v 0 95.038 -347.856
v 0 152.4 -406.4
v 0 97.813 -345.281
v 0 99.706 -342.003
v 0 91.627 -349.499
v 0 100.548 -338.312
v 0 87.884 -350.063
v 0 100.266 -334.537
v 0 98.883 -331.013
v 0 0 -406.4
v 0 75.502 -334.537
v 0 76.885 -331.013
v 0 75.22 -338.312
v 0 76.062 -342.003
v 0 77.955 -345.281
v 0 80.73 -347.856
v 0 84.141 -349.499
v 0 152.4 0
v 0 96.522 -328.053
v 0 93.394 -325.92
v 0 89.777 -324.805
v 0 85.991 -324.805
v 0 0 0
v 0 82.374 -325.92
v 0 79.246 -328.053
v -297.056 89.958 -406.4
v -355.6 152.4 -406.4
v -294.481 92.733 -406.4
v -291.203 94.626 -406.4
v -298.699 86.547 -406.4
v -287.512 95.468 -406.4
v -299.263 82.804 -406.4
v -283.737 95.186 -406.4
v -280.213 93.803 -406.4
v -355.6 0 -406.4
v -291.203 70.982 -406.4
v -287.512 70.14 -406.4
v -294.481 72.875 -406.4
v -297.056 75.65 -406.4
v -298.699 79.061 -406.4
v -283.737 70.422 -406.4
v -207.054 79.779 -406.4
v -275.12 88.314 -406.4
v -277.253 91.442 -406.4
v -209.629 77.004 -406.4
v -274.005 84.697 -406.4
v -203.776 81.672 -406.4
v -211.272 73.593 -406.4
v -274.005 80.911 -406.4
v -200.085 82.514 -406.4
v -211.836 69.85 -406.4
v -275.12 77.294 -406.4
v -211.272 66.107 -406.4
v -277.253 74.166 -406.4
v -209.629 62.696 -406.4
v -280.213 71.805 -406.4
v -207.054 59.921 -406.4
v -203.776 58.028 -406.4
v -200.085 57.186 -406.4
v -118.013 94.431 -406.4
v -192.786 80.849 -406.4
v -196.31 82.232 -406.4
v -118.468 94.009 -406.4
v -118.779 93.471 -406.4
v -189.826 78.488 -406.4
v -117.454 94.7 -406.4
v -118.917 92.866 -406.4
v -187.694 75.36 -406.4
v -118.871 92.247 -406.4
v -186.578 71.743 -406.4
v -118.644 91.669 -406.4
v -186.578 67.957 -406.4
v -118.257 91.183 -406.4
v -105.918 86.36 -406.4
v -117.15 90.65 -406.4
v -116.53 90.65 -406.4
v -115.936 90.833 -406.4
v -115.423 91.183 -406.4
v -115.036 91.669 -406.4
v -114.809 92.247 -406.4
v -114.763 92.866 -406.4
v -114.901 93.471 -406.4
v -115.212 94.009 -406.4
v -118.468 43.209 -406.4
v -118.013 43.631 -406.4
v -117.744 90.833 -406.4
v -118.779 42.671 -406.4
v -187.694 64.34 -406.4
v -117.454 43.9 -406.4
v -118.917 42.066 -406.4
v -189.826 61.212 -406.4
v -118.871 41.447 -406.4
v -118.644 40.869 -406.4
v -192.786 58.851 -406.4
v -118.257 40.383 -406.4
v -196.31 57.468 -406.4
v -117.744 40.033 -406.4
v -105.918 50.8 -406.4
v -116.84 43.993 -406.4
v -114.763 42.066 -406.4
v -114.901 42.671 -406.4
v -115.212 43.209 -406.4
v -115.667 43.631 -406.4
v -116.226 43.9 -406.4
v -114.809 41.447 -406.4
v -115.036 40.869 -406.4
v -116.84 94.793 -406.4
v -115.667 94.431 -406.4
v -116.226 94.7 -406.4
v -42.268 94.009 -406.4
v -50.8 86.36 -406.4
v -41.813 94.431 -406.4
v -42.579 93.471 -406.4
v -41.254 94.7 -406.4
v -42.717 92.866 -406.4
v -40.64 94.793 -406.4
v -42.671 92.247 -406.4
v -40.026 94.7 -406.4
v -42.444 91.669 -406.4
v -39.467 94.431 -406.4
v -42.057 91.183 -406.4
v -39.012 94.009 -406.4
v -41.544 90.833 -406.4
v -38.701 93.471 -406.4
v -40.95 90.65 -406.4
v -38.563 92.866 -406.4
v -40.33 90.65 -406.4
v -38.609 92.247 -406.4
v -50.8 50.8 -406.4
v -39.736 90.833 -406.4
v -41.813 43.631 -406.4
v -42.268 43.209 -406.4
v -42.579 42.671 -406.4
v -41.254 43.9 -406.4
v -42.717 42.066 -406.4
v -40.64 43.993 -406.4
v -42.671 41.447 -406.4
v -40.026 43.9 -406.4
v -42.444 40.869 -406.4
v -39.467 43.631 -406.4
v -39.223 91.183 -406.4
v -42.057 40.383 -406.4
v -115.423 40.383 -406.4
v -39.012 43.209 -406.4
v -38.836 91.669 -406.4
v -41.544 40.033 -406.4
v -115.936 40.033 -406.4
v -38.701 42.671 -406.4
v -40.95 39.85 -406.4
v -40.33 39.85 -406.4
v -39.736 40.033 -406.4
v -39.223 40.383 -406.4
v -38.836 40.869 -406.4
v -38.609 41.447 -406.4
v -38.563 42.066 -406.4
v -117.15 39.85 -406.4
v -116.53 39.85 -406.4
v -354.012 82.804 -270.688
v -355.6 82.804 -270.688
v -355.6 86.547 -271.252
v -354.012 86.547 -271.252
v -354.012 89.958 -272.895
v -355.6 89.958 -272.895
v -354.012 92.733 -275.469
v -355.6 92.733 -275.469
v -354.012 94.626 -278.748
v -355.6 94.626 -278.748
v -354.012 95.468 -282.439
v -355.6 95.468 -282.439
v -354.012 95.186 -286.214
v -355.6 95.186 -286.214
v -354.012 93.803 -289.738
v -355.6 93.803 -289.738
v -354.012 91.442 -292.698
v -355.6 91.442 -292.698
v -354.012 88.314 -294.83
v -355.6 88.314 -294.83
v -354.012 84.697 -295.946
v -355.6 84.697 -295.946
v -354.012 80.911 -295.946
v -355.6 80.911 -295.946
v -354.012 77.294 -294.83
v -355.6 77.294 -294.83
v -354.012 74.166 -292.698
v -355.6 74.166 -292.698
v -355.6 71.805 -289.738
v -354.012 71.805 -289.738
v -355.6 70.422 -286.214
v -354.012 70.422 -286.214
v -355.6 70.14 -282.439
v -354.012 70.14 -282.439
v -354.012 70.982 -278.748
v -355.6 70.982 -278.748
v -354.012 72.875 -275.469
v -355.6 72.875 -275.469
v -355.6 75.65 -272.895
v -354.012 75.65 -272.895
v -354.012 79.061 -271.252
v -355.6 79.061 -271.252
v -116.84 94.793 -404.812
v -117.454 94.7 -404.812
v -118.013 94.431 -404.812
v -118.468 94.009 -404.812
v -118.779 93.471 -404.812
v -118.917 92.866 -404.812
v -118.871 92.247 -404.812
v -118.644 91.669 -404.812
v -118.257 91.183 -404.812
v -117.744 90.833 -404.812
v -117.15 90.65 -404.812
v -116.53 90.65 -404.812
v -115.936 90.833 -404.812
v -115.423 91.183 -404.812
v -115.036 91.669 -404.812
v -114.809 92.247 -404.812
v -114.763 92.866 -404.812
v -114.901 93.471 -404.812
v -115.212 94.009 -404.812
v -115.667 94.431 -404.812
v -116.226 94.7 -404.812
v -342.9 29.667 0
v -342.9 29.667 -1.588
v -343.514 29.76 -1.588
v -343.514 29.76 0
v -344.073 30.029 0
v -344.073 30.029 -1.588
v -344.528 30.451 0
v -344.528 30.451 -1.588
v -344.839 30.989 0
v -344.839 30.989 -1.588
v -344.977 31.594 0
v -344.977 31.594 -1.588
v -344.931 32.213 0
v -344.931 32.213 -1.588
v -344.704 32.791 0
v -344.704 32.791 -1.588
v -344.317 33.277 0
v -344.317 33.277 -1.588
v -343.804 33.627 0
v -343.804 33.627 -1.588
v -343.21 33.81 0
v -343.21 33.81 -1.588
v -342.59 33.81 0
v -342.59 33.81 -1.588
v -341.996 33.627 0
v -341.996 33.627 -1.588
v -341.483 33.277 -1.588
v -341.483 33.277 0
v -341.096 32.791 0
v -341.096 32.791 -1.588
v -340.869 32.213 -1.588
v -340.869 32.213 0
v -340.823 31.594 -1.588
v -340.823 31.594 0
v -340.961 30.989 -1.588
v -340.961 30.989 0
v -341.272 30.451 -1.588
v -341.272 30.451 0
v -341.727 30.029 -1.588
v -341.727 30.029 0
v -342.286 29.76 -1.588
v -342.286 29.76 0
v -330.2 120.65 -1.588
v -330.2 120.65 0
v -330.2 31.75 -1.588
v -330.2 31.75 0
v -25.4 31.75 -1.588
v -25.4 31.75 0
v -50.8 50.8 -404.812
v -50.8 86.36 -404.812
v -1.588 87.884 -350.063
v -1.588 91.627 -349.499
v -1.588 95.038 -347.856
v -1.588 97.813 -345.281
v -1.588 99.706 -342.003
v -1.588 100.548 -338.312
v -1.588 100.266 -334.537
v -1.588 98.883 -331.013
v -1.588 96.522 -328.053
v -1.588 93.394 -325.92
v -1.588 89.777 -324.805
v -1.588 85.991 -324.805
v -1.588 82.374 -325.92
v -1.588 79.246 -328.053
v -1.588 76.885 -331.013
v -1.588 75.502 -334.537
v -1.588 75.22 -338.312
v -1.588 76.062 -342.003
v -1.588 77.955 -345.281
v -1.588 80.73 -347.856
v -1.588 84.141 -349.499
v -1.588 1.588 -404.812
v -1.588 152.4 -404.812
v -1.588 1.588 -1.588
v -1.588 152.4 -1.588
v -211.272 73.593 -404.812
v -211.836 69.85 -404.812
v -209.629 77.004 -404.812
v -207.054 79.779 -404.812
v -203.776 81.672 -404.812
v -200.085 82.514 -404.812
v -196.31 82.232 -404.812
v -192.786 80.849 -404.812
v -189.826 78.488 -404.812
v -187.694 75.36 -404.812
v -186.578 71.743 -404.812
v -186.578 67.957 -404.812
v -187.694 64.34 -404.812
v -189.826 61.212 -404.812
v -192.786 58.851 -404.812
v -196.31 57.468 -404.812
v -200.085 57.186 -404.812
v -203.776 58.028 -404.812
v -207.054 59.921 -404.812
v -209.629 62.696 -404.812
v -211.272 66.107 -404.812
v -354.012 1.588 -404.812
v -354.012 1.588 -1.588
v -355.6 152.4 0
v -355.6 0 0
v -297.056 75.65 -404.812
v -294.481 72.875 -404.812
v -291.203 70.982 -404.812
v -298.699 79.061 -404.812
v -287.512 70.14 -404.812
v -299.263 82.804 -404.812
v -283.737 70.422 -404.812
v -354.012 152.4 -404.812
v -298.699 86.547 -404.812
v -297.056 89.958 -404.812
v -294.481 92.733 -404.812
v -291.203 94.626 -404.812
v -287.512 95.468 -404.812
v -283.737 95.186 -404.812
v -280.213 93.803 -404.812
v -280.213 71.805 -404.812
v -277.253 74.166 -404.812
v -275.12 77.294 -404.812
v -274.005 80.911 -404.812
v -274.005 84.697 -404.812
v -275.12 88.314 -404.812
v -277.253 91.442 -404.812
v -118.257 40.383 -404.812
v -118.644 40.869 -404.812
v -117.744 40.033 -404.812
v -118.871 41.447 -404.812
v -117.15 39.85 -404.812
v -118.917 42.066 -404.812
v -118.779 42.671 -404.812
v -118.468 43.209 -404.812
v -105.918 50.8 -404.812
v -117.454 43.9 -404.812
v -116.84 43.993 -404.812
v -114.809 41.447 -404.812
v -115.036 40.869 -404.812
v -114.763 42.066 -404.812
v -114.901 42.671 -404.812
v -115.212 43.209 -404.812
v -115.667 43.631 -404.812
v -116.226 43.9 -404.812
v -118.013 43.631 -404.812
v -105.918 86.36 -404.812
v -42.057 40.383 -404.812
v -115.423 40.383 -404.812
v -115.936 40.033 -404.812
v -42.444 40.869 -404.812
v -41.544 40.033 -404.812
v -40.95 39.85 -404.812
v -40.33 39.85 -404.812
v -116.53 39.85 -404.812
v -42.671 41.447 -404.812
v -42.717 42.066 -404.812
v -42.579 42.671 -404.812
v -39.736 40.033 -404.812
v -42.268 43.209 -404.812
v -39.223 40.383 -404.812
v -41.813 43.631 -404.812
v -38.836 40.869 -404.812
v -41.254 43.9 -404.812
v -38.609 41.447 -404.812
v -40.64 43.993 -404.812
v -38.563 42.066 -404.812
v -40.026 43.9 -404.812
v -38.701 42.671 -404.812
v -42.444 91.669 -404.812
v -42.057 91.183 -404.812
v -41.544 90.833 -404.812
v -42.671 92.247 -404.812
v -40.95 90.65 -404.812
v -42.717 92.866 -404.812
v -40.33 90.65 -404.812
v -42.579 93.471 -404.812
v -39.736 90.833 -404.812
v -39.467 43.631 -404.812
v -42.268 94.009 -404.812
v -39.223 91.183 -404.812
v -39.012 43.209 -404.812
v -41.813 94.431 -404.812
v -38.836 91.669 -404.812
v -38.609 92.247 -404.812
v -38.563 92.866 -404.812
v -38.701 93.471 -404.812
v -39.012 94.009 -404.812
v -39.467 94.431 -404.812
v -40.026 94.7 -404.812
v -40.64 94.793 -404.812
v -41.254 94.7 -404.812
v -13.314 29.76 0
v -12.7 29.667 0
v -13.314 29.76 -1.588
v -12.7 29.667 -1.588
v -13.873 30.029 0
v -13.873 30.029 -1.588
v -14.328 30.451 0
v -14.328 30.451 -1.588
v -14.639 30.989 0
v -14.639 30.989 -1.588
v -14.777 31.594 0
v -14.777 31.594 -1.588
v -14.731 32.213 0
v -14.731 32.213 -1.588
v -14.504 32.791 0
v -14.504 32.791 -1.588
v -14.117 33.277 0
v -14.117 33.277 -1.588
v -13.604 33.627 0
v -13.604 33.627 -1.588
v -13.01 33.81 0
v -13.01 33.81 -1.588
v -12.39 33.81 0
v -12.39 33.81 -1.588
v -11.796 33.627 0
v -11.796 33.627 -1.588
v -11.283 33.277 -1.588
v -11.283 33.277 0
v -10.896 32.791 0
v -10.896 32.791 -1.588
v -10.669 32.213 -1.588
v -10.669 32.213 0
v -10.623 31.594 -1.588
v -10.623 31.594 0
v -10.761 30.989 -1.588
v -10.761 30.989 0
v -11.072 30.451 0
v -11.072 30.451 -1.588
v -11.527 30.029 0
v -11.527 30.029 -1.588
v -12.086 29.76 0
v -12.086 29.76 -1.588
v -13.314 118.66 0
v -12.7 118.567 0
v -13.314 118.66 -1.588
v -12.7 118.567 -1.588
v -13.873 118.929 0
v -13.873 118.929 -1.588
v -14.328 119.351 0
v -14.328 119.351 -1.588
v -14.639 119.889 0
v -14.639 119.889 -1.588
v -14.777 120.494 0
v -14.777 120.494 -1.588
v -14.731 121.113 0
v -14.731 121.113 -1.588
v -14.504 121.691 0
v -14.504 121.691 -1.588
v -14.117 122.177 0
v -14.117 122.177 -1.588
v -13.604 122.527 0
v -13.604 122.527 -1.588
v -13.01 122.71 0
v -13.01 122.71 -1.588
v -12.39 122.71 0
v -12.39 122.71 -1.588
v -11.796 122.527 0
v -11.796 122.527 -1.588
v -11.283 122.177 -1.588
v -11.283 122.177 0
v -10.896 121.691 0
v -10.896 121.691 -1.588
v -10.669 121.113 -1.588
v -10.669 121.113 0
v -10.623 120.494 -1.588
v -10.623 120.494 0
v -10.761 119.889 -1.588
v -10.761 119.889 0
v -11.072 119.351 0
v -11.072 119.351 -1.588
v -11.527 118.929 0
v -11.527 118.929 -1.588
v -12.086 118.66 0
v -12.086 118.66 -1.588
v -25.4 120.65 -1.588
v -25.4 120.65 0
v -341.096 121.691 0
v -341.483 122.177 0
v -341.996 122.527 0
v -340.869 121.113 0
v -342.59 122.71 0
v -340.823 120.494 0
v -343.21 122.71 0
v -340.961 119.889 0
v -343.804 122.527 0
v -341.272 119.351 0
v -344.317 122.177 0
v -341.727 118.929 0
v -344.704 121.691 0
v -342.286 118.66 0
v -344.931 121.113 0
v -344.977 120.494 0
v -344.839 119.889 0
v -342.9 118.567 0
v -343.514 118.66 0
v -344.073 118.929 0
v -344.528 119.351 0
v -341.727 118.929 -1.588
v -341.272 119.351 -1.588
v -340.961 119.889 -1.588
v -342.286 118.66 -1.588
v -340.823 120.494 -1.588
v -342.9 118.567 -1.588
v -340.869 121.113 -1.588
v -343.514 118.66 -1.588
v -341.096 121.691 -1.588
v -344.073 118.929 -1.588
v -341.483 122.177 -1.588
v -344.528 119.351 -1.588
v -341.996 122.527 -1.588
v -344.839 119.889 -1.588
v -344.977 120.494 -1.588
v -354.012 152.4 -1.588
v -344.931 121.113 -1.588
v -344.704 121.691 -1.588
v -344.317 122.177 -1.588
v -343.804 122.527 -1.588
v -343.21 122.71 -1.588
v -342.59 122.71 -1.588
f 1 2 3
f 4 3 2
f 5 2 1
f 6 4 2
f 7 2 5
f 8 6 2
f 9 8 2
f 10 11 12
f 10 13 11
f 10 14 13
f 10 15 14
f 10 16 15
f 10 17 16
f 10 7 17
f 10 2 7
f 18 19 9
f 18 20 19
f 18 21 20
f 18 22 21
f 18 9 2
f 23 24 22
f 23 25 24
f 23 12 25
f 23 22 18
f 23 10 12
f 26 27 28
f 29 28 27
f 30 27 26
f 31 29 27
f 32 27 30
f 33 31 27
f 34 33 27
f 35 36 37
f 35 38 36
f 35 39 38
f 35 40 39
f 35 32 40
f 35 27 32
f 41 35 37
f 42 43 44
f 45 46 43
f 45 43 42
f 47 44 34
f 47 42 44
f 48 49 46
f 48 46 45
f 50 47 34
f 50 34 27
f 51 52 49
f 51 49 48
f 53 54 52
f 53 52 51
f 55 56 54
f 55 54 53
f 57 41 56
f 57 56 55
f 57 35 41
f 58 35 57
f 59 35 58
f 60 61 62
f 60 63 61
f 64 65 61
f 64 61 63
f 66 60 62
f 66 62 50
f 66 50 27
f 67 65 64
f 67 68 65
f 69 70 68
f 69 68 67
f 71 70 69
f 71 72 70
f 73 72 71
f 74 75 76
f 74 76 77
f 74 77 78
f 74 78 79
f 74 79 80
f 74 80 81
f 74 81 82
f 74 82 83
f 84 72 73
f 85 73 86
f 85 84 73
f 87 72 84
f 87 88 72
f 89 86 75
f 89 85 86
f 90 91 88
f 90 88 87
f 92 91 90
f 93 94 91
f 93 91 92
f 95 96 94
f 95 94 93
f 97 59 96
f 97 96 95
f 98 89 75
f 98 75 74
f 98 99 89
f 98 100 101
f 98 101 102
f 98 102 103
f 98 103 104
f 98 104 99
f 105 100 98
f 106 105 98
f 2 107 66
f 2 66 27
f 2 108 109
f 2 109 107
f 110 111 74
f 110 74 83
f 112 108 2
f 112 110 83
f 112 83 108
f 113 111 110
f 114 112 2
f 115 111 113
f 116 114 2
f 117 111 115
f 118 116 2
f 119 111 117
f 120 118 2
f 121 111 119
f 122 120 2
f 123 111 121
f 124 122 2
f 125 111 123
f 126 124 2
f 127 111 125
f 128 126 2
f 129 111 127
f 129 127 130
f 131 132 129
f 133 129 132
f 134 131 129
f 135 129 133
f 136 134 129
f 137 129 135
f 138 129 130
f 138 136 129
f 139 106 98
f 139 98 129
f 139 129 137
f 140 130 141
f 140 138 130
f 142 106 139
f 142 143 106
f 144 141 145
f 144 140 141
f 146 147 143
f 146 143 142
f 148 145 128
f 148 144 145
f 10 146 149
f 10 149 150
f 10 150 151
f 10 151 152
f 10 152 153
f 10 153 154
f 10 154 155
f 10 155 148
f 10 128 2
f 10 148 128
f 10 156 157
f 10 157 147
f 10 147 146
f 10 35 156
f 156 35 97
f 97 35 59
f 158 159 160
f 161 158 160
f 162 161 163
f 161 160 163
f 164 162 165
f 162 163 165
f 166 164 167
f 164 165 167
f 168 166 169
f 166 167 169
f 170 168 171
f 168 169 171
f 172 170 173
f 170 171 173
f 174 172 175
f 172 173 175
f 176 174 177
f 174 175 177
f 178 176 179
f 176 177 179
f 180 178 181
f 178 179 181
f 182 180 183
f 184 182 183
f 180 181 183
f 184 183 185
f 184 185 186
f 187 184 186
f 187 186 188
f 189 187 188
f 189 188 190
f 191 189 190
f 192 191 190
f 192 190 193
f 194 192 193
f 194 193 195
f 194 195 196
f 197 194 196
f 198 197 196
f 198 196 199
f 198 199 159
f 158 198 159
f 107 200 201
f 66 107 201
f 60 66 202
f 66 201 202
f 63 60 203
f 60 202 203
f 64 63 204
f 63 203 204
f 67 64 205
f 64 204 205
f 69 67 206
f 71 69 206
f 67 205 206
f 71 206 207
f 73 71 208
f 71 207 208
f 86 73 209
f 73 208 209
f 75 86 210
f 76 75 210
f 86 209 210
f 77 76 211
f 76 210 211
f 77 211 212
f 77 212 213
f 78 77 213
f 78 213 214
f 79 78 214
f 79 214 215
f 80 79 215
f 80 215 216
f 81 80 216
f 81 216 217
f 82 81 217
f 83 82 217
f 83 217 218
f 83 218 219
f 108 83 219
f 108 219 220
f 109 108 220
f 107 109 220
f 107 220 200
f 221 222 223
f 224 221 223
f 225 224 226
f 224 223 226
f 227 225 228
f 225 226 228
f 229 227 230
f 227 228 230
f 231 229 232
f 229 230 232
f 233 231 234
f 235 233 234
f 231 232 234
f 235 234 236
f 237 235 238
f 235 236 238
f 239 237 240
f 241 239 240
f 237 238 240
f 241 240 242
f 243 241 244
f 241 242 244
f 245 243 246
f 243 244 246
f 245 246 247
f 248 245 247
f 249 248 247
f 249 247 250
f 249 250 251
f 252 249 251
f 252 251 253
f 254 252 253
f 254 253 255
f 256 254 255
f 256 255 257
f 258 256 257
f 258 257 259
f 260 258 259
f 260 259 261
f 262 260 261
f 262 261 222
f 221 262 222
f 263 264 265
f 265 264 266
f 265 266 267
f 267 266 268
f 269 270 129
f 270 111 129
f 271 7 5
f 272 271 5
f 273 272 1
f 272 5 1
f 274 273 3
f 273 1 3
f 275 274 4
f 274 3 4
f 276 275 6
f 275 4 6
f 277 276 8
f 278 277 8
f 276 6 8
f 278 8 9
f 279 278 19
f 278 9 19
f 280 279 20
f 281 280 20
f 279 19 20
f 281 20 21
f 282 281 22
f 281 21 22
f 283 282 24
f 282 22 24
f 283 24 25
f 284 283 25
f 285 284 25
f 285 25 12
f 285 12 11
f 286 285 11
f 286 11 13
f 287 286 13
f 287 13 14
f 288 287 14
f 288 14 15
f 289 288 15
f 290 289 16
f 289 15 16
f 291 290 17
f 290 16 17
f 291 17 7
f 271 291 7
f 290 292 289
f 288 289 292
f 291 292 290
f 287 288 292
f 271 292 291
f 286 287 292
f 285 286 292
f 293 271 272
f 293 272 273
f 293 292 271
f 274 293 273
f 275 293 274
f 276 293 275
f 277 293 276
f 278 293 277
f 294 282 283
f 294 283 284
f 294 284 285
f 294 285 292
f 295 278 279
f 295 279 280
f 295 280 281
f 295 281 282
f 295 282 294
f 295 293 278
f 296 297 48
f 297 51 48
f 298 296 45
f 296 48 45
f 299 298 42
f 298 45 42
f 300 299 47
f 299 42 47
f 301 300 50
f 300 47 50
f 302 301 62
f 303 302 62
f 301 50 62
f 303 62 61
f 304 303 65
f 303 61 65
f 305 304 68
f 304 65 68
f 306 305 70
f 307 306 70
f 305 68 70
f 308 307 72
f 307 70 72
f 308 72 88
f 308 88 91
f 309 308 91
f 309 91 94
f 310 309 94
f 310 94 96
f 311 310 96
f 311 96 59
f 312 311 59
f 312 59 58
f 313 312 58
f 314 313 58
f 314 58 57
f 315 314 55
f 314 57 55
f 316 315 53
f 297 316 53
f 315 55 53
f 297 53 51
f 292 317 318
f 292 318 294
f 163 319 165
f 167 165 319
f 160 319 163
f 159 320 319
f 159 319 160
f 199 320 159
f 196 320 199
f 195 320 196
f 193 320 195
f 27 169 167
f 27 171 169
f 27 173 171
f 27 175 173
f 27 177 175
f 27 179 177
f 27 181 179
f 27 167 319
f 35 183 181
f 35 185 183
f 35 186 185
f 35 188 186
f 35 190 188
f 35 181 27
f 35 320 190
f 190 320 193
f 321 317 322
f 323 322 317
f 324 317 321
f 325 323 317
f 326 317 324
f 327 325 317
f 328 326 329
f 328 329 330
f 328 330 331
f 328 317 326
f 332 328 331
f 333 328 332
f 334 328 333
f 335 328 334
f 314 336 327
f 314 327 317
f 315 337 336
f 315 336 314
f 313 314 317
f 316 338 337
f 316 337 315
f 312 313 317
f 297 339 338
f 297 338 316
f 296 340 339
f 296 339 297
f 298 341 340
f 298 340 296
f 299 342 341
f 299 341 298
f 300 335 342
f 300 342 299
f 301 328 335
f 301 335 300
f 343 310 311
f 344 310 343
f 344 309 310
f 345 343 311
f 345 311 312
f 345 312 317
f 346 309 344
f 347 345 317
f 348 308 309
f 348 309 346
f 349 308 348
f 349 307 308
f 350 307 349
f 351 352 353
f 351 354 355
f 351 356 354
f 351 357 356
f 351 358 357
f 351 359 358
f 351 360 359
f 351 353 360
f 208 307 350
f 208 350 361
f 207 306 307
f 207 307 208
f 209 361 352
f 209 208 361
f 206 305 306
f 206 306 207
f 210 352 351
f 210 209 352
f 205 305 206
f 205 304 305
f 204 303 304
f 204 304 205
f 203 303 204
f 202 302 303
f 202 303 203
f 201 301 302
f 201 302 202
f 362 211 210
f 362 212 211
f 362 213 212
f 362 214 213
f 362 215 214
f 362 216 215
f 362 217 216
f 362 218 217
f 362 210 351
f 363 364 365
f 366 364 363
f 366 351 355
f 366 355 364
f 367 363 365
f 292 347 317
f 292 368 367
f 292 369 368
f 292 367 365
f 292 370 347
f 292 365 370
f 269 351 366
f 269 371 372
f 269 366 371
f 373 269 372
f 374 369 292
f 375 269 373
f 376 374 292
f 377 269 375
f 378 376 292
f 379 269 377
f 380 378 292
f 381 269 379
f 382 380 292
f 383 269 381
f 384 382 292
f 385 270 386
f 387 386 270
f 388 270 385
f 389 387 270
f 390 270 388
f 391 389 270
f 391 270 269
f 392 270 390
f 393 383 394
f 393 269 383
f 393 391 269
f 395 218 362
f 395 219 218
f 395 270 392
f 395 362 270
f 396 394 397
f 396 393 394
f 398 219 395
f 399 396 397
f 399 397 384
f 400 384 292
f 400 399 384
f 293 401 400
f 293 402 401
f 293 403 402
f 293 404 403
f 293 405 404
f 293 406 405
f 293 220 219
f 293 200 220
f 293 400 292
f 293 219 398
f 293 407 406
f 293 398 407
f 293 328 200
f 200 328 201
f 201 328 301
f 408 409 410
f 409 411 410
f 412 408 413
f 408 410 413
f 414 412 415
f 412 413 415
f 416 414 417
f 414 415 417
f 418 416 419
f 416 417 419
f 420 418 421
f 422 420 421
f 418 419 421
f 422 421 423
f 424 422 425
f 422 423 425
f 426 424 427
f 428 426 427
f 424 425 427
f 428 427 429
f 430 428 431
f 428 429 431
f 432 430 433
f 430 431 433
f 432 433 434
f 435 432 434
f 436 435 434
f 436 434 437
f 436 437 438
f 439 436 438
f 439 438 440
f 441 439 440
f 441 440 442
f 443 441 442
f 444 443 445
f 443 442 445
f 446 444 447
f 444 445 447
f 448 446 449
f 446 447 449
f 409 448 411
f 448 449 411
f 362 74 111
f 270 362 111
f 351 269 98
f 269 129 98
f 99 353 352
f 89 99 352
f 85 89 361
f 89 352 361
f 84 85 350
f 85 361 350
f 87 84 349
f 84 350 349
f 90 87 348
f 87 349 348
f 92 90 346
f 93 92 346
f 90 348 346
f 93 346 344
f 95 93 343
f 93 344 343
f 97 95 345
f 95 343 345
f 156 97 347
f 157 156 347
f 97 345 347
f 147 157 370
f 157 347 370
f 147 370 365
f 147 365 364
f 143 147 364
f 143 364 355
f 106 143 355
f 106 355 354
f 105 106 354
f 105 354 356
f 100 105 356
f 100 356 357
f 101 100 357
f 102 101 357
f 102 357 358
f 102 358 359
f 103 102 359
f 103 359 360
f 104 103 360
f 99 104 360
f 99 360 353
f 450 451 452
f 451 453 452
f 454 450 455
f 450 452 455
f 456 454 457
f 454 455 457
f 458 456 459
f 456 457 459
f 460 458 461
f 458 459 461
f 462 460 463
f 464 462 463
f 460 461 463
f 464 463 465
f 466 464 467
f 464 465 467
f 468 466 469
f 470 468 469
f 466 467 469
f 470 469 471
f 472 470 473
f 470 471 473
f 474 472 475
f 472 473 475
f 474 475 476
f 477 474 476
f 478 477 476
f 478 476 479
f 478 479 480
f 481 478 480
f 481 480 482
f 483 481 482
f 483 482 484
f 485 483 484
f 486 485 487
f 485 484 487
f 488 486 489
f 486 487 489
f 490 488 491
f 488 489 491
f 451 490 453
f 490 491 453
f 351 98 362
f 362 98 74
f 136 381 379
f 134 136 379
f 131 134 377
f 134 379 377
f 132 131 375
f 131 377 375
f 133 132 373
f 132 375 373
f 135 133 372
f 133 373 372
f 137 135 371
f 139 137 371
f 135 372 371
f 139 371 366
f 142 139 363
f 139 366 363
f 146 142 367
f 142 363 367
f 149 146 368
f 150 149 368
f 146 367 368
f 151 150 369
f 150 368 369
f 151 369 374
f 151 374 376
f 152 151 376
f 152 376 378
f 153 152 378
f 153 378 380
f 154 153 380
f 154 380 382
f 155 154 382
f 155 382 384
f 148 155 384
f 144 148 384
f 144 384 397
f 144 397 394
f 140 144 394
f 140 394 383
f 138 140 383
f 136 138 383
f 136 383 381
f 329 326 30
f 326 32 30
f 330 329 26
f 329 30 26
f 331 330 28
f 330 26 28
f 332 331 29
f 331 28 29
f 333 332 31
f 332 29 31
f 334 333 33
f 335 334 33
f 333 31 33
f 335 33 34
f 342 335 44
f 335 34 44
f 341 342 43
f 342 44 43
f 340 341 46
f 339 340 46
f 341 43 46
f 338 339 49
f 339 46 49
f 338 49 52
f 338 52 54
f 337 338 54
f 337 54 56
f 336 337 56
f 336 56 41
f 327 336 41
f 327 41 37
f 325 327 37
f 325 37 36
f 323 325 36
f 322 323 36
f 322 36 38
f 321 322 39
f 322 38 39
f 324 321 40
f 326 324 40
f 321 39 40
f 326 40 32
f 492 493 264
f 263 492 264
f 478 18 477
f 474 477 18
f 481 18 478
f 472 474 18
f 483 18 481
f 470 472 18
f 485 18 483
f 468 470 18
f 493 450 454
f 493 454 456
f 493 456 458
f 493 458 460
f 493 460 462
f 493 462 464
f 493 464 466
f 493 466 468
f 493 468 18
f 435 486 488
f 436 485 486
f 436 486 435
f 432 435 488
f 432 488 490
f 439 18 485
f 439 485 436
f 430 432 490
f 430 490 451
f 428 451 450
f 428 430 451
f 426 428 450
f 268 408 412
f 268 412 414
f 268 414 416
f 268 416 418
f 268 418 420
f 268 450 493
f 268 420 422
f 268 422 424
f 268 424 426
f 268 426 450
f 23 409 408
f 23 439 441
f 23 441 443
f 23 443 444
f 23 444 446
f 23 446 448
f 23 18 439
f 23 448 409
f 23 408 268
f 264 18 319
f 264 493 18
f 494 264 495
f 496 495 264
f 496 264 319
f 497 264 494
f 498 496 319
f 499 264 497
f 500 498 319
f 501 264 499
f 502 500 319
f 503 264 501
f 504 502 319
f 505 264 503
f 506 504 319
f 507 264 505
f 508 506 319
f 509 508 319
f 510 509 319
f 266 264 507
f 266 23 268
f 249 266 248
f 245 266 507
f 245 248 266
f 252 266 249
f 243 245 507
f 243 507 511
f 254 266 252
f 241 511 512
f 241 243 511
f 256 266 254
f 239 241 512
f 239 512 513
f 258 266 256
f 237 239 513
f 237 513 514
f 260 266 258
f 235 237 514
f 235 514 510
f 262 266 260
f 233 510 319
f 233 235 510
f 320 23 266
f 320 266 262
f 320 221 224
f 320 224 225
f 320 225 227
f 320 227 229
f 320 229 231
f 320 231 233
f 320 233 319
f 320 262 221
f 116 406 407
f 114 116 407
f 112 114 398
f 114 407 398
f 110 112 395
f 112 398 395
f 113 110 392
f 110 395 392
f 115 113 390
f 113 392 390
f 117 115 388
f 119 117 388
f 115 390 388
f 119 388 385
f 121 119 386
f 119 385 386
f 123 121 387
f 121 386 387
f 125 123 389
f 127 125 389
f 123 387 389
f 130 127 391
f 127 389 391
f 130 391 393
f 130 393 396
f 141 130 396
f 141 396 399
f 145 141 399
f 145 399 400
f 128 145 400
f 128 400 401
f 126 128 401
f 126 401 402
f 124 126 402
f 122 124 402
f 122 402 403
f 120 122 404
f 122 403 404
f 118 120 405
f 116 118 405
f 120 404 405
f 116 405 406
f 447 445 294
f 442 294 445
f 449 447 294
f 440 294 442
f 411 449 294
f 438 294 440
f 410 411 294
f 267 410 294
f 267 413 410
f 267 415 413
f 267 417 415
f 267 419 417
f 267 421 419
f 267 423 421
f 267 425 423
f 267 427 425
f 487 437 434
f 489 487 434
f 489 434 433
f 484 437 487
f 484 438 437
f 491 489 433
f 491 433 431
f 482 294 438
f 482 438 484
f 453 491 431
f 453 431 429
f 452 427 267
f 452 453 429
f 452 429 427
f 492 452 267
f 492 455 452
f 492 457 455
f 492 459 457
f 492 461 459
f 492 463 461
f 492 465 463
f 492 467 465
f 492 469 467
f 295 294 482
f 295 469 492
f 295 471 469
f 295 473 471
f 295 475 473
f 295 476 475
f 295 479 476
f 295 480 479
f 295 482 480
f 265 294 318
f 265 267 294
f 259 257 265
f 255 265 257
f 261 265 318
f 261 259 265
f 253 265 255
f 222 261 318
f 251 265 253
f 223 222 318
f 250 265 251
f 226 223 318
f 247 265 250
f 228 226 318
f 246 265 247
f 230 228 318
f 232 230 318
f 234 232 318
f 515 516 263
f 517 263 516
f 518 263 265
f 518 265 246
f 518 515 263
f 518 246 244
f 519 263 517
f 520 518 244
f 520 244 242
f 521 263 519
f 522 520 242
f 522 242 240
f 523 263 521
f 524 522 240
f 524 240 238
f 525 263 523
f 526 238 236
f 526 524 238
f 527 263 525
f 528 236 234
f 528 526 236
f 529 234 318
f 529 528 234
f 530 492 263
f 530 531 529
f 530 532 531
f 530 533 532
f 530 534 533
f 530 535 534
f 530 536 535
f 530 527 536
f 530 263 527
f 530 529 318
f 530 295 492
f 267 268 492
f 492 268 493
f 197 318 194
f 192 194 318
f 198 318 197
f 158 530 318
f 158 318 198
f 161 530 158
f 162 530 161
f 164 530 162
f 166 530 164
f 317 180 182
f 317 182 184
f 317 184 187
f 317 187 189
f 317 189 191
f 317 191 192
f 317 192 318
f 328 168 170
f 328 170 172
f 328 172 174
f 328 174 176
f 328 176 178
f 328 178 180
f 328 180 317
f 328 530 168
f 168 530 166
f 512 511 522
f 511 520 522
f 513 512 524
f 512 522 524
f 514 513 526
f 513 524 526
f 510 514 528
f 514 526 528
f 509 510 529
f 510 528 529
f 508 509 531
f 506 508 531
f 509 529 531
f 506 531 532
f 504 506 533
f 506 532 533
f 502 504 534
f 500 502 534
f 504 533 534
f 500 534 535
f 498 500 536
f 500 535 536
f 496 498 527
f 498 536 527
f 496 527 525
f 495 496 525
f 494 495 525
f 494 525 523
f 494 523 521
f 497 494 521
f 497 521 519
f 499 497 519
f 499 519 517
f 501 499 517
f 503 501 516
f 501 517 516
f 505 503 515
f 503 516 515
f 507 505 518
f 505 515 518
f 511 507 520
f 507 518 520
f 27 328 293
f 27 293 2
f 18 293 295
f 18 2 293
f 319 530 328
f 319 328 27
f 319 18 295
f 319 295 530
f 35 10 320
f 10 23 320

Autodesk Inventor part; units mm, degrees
ref_plane "YZ Plane" through (0, 0, 0) normal (1, 0, 0) x (0, 1, 0)
ref_plane "XZ Plane" through (0, 0, 0) normal (0, 1, 0) x (-1, 0, 0)
ref_plane "XY Plane" through (0, 0, 0) normal (0, 0, 1) x (1, 0, 0)
sketch "Sketch1" plane through (0, 0, 0) normal (0, 1, 0) x (-1, 0, 0)
  line L0 (0, 0) -> (355.6, 0)
  line L1 (355.6, 0) -> (355.6, -406.4)
  line L2 (355.6, -406.4) -> (0, -406.4)
  line L3 (0, -406.4) -> (0, 0)
  dimension "d0" = 355.6
  dimension "d1" = 406.4
extrude "Extrusion1" add sketch "Sketch1" along normal blind 152.4
sketch "Sketch2" plane through (0, 152.4, 0) normal (0, 1, 0) x (1, 0, 0)
  line L0 (-355.6, 0) -> (0, 0) projected
  line L1 (0, 0) -> (0, 406.4) projected
  line L2 (0, 406.4) -> (-355.6, 406.4) projected
  line L3 (-355.6, 406.4) -> (-355.6, 0) projected
  line L4 (-1.5875, 1.5875) -> (-354.0125, 1.5875)
  line L5 (-354.0125, 1.5875) -> (-354.0125, 404.8125)
  line L6 (-354.0125, 404.8125) -> (-1.5875, 404.8125)
  line L7 (-1.5875, 404.8125) -> (-1.5875, 1.5875)
  dimension "d4" = 1.5875
  dimension "d5" = 1.5875
  dimension "d6" = 1.5875
  dimension "d7" = 1.5875
extrude "Extrusion2" cut sketch "Sketch2" against normal blind 150.8125 contours L4 L5 L6 L7
sketch "Sketch6" plane through (0, 0, 0) normal (1, 0, 0) x (0, 0, -1)
  line L0 (406.4, 0) -> (406.4, 152.4) projected
  line L1 (406.4, 0) -> (0, 0) projected
  circle A0 centre (337.3628, 87.884) radius 12.7
  dimension "d39" = 25.4
  dimension "d40" = 69.0372
  dimension "d41" = 87.884
extrude "Extrusion4" cut sketch "Sketch6" against normal up to surface (1.5875 mm away)
sketch "Sketch7" plane through (0, 0, -406.4) normal (0, 0, -1) x (-1, 0, 0)
  circle A0 centre (286.5628, 82.804) radius 12.7
  line L0 (355.6, 0) -> (0, 0) projected
  line L1 (0, 0) -> (0, 152.4) projected
  circle A1 centre (199.136, 69.85) radius 12.7
  line L2 (1.5875, 152.4) -> (1.5875, 1.5875) projected
  line L3 (355.6, 0) -> (355.6, 152.4) projected
  point P0 (1.5875, 0)
  dimension "d23" = 82.804
  dimension "d25" = 25.4
  dimension "d28" = 25.4
  dimension "d128" = 199.136
  dimension "d129" = 69.0372
  dimension "d154" = 69.85
extrude "Extrusion5" cut sketch "Sketch7" against normal blind 25.4
sketch "Sketch9" plane through (-355.6, 0, 0) normal (0, 0, 1) x (1, 0, 0)
  line L0 (25.4, 31.75) -> (330.2, 31.75)
  line L1 (330.2, 31.75) -> (330.2, 120.65)
  line L2 (330.2, 120.65) -> (25.4, 120.65)
  line L3 (25.4, 120.65) -> (25.4, 31.75)
  line L4 (355.6, 0) -> (355.6, 152.4) projected
  line L5 (355.6, 0) -> (0, 0) projected
  line L6 (0, 0) -> (0, 152.4) projected
  dimension "d61" = 304.8
  dimension "d62" = 88.9
  dimension "d64" = 31.75
  dimension "d110" = 355.6
  dimension "d111" = 25.4
extrude "Extrusion6" cut sketch "Sketch9" against normal blind 25.4
sketch "Sketch12" plane through (0, 0, -406.4) normal (0, 0, -1) x (-1, 0, 0)
  line L0 (50.8, 50.8) -> (105.918, 50.8)
  line L1 (105.918, 50.8) -> (105.918, 86.36)
  line L2 (105.918, 86.36) -> (50.8, 86.36)
  line L3 (50.8, 86.36) -> (50.8, 50.8)
  line L4 (63.7794, 81.9658) -> (92.9132, 81.9658) projected
  line L5 (0, 0) -> (0, 152.4) projected
  line L6 (355.6, 0) -> (0, 0) projected
  dimension "d120" = 35.56
  dimension "d121" = 55.118
  dimension "d122" = 50.8
  dimension "d123" = 50.8
extrude "Extrusion8" cut sketch "Sketch12" against normal blind 25.4
sketch "Sketch13" plane through (-355.6, 0, -406.4) normal (-1, 0, 0) x (0, 0, 1)
  circle A0 centre (123.0122, 82.804) radius 12.7
  circle A1 centre (69.0372, 87.884) radius 12.7 projected
  circle A2 centre (69.0372, 87.884) radius 12.7 projected
  line L0 (0, 0) -> (406.4, 0) projected
  line L1 (0, 0) -> (0, 152.4) projected
  line L2 (406.4, 152.4) -> (0, 152.4) projected
  line L3 (406.4, 0) -> (406.4, 152.4) projected
  dimension "d132" = 25.4
  dimension "d133" = 87.884
  dimension "d134" = 82.804
  dimension "d135" = 123.0122
extrude "Extrusion9" cut sketch "Sketch13" against normal up to surface (1.5875 mm away) contours A0
sketch "Sketch14" plane through (-355.6, 0, 0) normal (0, 0, 1) x (1, 0, 0)
  circle A0 centre (342.9, 120.65) radius 2.0828 projected
  circle A1 centre (342.9, 31.75) radius 2.0828 projected
  circle A2 centre (12.7, 31.75) radius 2.0828 projected
  circle A3 centre (12.7, 120.65) radius 2.0828 projected
  point P0 (355.6, 0)
hole "Hole1" at (-12.7, 120.65, 0) at (-12.7, 31.75, 0) at (-342.9, 31.75, 0) at (-342.9, 120.65, 0) direction (0, 0, -1) diameter 4.1656 depth 6.35 tip angle 118
sketch "Sketch15" plane through (0, 0, -406.4) normal (0, 0, -1) x (-1, 0, 0)
  circle A0 centre (40.64, 41.91) radius 1.7526 projected
  circle A1 centre (116.84, 92.71) radius 1.7526 projected
  circle A2 centre (40.64, 92.71) radius 1.7526 projected
  circle A3 centre (116.84, 41.91) radius 1.7526 projected
  circle A4 centre (56.261, 55.372) radius 2.1463 projected
  circle A5 centre (101.219, 79.248) radius 2.1463 projected
  circle A6 centre (101.219, 55.372) radius 2.1463 projected
  circle A7 centre (56.261, 79.248) radius 2.1463 projected
  arc A8 (64.1858, 79.0702) -> (57.8358, 72.7202) centre (64.1858, 72.7202) ccw projected
  line L0 (64.1858, 79.0702) -> (93.3196, 79.0702) projected
  arc A9 (99.6696, 72.7202) -> (93.3196, 79.0702) centre (93.3196, 72.7202) ccw projected
  line L1 (99.6696, 72.7202) -> (99.6696, 61.5442) projected
  arc A10 (93.3196, 55.1942) -> (99.6696, 61.5442) centre (93.3196, 61.5442) ccw projected
  line L2 (93.3196, 55.1942) -> (64.1858, 55.1942) projected
  arc A11 (57.8358, 61.5442) -> (64.1858, 55.1942) centre (64.1858, 61.5442) ccw projected
  line L3 (57.8358, 61.5442) -> (57.8358, 72.7202) projected
  line L4 (123.19, 99.06) -> (34.29, 99.06) projected
  line L5 (34.29, 99.06) -> (34.29, 35.56) projected
  line L6 (34.29, 35.56) -> (123.19, 35.56) projected
  line L7 (123.19, 35.56) -> (123.19, 99.06) projected
  line L8 (74.4123, 41.91) -> (73.7537, 41.91) projected
  line L9 (73.7537, 41.91) -> (73.7537, 47.6322) projected
  line L10 (73.7537, 47.6322) -> (72.6267, 47.6322) projected
  line L11 (72.6267, 47.6322) -> (72.6267, 48.2806) projected
  line L12 (72.6267, 48.2806) -> (75.7245, 48.2806) projected
  line L13 (75.7245, 48.2806) -> (75.7245, 47.6322) projected
  line L14 (75.7245, 47.6322) -> (74.5718, 47.6322) projected
  line L15 (74.5718, 47.6322) -> (74.5718, 43.3766) projected
  line L16 (74.5718, 43.3766) -> (75.7245, 43.3766) projected
  line L17 (75.7245, 43.3766) -> (75.7245, 42.7951) projected
  spline S0 degree 2 poles (75.7245, 42.7951) (75.071, 42.7951) (74.4535, 42.4246) (74.4123, 41.91) knots 0 0 0 1 2 2 2 projected
  line L18 (82.8979, 42.6047) -> (84.2409, 42.6047) projected
  line L19 (84.2409, 42.6047) -> (84.2409, 41.9306) projected
  line L20 (84.2409, 41.9306) -> (82.0539, 41.9306) projected
  line L21 (82.0539, 41.9306) -> (82.0539, 46.6288) projected
  spline S1 degree 2 poles (82.0539, 46.6288) (82.0539, 47.4624) (83.0728, 48.3681) (83.9322, 48.3681) knots 0 0 0 1 2 2 2 projected
  spline S2 degree 2 poles (83.9322, 48.3681) (84.138, 48.3681) (84.8224, 48.296) (85.054, 48.2446) knots 0 0 0 1 2 2 2 projected
  line L22 (85.054, 48.2446) -> (85.054, 47.4315) projected
  line L23 (85.054, 47.4315) -> (85.0077, 47.4315) projected
  spline S3 degree 2 poles (85.0077, 47.4315) (84.8327, 47.4933) (84.313, 47.6373) (84.0454, 47.6373) knots 0 0 0 1 2 2 2 projected
  spline S4 degree 2 poles (84.0454, 47.6373) (83.6543, 47.6373) (83.186, 47.4572) (83.078, 47.2926) knots 0 0 0 1 2 2 2 projected
  spline S5 degree 2 poles (83.078, 47.2926) (82.9596, 47.1228) (82.8979, 46.6288) (82.8979, 46.3046) knots 0 0 0 1 2 2 2 projected
  line L24 (82.8979, 46.3046) -> (82.8979, 42.6047) projected
  spline S6 degree 2 poles (80.4896, 42.7951) (79.8361, 42.7951) (79.2186, 42.4246) (79.1774, 41.91) knots 0 0 0 1 2 2 2 projected
  line L25 (79.1774, 41.91) -> (78.5187, 41.91) projected
  line L26 (78.5187, 41.91) -> (78.5187, 47.6322) projected
  line L27 (78.5187, 47.6322) -> (77.3918, 47.6322) projected
  line L28 (77.3918, 47.6322) -> (77.3918, 48.2806) projected
  line L29 (77.3918, 48.2806) -> (80.4896, 48.2806) projected
  line L30 (80.4896, 48.2806) -> (80.4896, 47.6322) projected
  line L31 (80.4896, 47.6322) -> (79.3369, 47.6322) projected
  line L32 (79.3369, 47.6322) -> (79.3369, 43.3766) projected
  line L33 (79.3369, 43.3766) -> (80.4896, 43.3766) projected
  line L34 (80.4896, 43.3766) -> (80.4896, 42.7951) projected
  point P0 (0, 0)
hole "Hole2" at (-116.84, 92.71, -406.4) at (-116.84, 41.91, -406.4) at (-40.64, 41.91, -406.4) at (-40.64, 92.71, -406.4) direction (0, 0, 1) diameter 4.1656 depth 6.35 tip angle 118
thread "Thread1" size "8-32 UNC" class "2B" standard "ANSI Unified Screw Threads" full length
thread "Thread2" size "8-32 UNC" class "2B" standard "ANSI Unified Screw Threads" full length
thread "Thread3" size "8-32 UNC" class "2B" standard "ANSI Unified Screw Threads" full length
thread "Thread4" size "8-32 UNC" class "2B" standard "ANSI Unified Screw Threads" full length
thread "Thread5" size "8-32 UNC" class "2B" standard "ANSI Unified Screw Threads" full length
thread "Thread6" size "8-32 UNC" class "2B" standard "ANSI Unified Screw Threads" full length
thread "Thread7" size "8-32 UNC" class "2B" standard "ANSI Unified Screw Threads" full length
thread "Thread8" size "8-32 UNC" class "2B" standard "ANSI Unified Screw Threads" full length
equation "\"d5\" = d4"
equation "\"d6\" = d4"
equation "\"d7\" = d4"
equation "\"d28\" = d25"
equation "\"d26\" = d28"
equation "\"d111\" = -0.5 * d61 + 0.5 * d110"
properties part number "18x12x6Box"
